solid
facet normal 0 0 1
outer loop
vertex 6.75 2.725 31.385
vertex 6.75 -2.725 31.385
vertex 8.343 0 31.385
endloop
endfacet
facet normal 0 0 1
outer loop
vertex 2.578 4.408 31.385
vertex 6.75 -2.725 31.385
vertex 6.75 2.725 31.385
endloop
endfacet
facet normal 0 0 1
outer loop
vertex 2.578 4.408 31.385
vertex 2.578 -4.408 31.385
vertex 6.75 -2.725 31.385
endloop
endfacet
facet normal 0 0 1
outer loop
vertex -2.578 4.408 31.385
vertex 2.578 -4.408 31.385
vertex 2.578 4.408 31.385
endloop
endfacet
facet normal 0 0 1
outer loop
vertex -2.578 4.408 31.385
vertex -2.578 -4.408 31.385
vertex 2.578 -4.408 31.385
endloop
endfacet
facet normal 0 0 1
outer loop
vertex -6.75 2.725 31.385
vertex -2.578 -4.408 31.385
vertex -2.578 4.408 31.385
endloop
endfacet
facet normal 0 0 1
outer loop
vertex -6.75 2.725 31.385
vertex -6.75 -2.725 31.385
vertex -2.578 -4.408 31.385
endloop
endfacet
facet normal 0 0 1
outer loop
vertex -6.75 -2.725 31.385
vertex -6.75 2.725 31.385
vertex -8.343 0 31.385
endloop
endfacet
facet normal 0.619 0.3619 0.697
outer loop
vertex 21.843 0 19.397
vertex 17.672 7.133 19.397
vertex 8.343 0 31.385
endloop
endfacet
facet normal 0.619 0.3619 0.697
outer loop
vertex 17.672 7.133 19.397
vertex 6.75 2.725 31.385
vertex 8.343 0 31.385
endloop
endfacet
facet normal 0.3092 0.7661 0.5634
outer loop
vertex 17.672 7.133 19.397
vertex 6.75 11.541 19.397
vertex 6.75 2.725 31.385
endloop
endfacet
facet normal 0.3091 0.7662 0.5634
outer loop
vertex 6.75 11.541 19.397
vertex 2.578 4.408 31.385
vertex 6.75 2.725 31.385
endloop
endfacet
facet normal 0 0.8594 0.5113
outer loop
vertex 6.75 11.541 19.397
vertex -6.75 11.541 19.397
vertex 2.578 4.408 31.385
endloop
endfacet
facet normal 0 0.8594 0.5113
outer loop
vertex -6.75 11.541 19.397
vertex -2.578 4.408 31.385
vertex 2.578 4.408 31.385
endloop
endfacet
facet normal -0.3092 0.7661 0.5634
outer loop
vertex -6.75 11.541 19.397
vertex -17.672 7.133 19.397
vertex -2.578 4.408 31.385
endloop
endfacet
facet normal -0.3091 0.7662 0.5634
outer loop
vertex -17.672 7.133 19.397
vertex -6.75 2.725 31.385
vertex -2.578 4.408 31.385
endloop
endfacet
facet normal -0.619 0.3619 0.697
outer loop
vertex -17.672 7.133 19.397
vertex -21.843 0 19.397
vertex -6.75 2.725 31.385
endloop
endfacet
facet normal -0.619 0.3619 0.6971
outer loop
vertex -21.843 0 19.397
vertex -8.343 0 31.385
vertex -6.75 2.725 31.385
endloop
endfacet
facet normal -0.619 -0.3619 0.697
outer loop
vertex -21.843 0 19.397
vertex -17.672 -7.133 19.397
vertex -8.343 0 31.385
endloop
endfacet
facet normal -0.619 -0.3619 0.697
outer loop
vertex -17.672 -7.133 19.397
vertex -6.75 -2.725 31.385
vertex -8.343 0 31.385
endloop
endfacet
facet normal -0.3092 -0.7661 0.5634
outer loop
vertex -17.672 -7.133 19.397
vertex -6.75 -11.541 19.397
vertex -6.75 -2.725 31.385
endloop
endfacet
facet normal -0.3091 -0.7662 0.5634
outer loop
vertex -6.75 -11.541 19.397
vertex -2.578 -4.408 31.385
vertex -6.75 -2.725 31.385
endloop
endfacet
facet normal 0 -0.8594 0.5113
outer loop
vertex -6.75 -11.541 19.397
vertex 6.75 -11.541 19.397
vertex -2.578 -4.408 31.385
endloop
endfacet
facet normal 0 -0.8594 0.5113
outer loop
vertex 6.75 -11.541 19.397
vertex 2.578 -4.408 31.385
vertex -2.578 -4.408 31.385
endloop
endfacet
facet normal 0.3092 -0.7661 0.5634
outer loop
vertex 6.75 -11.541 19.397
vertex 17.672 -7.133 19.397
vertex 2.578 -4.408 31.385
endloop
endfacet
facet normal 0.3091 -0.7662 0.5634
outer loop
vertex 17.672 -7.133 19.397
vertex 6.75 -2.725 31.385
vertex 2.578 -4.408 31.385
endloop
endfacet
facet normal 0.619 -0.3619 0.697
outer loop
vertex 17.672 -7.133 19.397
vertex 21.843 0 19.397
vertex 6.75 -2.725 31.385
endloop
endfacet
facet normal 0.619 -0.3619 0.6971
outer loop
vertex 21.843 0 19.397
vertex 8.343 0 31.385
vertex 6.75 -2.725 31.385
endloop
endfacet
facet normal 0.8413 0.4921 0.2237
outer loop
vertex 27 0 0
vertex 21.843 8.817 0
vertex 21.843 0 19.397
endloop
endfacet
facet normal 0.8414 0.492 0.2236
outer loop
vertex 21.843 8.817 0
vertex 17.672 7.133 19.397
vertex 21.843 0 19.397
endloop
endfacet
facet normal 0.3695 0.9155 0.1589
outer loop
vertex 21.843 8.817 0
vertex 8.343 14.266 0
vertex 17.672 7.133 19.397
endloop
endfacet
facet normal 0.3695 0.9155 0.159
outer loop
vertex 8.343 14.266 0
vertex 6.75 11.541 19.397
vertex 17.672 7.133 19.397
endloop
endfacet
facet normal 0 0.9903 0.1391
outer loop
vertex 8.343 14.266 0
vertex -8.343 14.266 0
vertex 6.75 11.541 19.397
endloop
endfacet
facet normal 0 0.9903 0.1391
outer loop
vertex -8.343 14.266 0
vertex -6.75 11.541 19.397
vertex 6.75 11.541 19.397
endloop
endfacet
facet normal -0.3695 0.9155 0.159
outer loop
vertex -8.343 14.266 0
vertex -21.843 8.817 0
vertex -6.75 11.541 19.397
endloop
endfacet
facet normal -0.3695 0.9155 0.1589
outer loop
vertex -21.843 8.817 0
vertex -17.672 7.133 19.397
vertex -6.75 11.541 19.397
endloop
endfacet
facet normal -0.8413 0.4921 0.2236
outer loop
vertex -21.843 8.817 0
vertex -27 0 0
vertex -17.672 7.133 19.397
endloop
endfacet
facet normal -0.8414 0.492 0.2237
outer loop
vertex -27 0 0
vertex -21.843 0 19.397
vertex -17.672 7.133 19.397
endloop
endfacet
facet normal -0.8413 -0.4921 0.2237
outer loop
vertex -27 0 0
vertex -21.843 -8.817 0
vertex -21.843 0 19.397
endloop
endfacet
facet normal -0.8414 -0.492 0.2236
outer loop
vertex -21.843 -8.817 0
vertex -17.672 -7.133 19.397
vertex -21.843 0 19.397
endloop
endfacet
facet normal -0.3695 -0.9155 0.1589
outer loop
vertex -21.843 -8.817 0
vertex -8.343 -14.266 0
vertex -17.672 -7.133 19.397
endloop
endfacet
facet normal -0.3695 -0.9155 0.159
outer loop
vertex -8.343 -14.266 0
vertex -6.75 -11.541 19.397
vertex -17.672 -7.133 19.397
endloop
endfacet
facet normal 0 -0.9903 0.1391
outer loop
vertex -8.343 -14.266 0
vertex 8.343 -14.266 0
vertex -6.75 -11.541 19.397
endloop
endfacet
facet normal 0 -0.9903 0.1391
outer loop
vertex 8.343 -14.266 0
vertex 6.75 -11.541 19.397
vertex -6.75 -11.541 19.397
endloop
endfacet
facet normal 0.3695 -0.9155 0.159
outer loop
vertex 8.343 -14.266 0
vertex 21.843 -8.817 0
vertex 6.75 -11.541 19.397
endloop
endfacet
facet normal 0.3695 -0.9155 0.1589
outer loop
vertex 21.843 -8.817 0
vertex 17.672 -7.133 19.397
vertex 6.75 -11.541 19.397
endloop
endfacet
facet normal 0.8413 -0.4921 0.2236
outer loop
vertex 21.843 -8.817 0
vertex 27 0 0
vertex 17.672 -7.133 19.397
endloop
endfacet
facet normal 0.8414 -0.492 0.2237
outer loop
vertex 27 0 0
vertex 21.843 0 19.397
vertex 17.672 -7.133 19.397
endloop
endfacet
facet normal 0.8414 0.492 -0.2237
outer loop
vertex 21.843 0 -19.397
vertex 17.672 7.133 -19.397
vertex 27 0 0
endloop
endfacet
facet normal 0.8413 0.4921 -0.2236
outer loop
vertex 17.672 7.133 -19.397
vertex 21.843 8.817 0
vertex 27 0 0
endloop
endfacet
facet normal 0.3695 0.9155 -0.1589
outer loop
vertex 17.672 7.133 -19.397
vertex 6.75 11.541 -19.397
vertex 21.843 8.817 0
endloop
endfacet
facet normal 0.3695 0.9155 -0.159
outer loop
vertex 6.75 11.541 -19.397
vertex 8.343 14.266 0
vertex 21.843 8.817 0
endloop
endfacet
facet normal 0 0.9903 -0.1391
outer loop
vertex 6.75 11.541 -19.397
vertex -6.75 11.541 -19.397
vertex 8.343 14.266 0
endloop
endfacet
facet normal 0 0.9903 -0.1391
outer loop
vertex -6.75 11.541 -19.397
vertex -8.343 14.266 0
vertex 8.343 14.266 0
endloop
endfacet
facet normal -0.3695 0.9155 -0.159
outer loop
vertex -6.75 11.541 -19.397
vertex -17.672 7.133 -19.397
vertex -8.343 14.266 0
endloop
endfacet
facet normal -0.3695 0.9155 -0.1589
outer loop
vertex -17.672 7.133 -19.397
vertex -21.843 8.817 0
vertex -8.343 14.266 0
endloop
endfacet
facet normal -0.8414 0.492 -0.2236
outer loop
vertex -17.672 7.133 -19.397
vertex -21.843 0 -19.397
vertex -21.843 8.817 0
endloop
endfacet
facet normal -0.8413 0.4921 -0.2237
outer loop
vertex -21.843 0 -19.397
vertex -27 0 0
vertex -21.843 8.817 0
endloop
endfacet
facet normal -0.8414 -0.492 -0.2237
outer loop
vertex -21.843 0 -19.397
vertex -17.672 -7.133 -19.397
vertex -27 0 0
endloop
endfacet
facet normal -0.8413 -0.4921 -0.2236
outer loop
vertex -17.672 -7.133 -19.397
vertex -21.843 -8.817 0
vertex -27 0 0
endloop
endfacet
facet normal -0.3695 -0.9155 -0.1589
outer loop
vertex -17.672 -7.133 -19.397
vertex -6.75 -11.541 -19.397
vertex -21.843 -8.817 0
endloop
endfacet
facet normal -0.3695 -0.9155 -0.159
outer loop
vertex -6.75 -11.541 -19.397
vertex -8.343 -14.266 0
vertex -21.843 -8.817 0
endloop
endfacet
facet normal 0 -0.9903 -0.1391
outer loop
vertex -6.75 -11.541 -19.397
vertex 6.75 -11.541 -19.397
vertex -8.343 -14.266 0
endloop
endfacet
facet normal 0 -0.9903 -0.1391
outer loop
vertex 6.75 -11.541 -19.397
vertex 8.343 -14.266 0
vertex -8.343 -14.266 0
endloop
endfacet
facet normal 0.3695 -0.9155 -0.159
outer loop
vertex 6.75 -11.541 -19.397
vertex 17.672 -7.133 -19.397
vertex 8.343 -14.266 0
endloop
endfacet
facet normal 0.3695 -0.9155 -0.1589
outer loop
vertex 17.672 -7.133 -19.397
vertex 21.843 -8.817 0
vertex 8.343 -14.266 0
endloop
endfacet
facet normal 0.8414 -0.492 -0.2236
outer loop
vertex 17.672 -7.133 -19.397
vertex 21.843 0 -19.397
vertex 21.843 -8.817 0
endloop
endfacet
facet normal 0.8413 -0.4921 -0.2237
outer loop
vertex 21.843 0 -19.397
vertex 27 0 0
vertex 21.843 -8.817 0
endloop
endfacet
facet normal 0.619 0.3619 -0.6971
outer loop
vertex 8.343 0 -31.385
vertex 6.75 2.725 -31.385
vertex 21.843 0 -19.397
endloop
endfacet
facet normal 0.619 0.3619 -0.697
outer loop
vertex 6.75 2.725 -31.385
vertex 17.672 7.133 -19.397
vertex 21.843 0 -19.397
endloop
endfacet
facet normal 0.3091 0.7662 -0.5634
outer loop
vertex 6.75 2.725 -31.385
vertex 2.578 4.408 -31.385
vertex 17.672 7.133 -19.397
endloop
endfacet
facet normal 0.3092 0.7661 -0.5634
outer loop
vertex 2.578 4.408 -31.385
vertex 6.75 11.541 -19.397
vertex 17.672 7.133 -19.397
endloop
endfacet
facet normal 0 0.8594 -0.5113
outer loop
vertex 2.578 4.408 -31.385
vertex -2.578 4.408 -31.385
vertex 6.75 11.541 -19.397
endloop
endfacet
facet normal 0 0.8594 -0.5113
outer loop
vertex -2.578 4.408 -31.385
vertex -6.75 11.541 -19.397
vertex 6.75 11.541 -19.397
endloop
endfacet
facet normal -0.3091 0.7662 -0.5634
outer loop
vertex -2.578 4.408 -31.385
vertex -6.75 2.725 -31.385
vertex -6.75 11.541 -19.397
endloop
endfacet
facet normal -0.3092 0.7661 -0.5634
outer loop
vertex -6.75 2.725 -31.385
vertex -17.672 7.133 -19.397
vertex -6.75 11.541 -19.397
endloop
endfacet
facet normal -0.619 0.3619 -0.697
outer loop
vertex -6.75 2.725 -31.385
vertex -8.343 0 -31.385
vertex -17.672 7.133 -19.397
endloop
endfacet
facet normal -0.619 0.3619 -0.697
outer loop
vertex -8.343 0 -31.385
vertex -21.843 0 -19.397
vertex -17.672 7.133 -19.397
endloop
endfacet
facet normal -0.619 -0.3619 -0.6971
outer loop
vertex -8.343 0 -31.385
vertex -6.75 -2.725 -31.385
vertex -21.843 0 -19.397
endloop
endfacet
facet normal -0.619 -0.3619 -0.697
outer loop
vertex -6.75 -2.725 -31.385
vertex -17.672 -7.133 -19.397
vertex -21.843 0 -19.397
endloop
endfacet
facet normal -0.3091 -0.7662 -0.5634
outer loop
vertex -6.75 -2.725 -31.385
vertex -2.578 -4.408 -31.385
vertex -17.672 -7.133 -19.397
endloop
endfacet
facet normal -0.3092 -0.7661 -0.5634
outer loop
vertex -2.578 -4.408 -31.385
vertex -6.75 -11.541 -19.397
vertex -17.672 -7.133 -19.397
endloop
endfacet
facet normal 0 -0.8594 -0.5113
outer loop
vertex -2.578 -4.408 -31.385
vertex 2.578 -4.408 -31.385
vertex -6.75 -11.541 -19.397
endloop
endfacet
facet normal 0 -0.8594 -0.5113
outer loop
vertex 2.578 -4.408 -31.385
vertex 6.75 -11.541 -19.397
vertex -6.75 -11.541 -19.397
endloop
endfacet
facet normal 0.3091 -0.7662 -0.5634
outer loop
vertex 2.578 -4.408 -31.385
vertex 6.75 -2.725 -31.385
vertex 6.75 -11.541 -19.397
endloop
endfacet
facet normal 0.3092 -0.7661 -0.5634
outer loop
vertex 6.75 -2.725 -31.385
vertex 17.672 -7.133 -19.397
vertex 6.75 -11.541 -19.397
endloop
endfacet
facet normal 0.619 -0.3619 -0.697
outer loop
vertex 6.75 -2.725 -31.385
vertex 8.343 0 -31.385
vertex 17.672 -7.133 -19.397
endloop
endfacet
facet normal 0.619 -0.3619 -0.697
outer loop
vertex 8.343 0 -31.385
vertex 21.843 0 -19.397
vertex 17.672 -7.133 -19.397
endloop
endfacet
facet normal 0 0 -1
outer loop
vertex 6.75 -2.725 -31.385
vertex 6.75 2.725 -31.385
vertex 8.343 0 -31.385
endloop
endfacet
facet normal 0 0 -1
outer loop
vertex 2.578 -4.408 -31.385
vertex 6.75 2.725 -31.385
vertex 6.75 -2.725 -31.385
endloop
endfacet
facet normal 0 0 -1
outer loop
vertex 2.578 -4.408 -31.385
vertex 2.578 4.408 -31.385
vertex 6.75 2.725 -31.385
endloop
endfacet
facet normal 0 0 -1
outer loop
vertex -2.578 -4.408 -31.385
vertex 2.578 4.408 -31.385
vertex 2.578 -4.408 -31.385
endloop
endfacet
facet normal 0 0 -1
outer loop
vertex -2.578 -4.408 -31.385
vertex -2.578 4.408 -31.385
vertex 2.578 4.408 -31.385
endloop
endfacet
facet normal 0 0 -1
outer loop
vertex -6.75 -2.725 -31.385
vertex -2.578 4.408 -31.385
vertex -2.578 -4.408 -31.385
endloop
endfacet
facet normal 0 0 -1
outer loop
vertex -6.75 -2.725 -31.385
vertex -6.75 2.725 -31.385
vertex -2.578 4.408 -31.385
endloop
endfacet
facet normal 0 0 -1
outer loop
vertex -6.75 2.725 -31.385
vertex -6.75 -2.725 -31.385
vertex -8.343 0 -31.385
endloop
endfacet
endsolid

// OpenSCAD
// Generated by SolidPython 1.0.1 on 2020-07-29 00:46:48


scale(v = [9, 5, 11]) {
	sphere(r = 3);
}
/***********************************************
*********      SolidPython code:      **********
************************************************
 
# import packages: SolidPython
from solid import *
from solid.utils import *
from itertools import chain, combinations, permutations


class Resize:

    def __init__(self, scad_file):
        self.scad_file = scad_file
        #self.scad_file = import_scad(scad_file)
        # cone/cylinder param:
        self.r1 = 0
        self.r2 = 0
        self.h = 0
        # rectangular prism param:
        self.w = 0
        self.l = 0
        # ellipse param:
        self.r = 0

    # import OpenScad code (file name corresponds to shape)


    # classify shape + parameters
    def assign(self, param1, param2, param3):
        if self.scad_file == 'cone.scad':
            self.r1 = param1
            self.r2 = param2
            self.h = param3
        elif self.scad_file == 'cylinder.scad':
            self.r1 = param1
            self.r2 = param2
            self.h = param3
        elif self.scad_file == 'rectangularPrism.scad':
            self.h = param1
            self.l = param2
            self.w = param3
        else:
            self.r = param1
            self.h = param2

    # resize parameters
    def iterate(self):
        x = range(3, 20, 2)
        i = 1
        if self.scad_file == 'cone.scad':
            tempList = list(permutations(x, 2))
            for temp in tempList:
                param1 = temp[0]
                param2 = temp[1]
                filepath = 'produced_scad_files/' + 'cone' + str(param1) + '_' + str(param2) + '_' + '.scad'
                scad_render_to_file(cylinder(h=param1, r1=param2, r2=0), filepath)

        elif self.scad_file == 'cylinder.scad':
            tempList = list(permutations(x, 3))
            for temp in tempList:
                param1 = temp[0]
                param2 = temp[1]
                filepath = 'produced_scad_files/' + 'cylinder' + str(param1) + '_' + str(param2) + '_' + '.scad'
                scad_render_to_file(cylinder(h=param1, r1=param2, r2=param2), filepath)

        elif self.scad_file == 'rectangularPrism.scad':
            tempList = list(permutations(x, 3))
            for temp in tempList:
                param1 = temp[0]
                param2 = temp[1]
                param3 = temp[2]
                filepath = 'produced_scad_files/' + 'rectangularPrism' + str(param1) + '_' + str(param2) + '_' + str(
                    param3) + '.scad'
                scad_render_to_file(cube(size=(param1, param2, param3)), filepath)

        elif self.scad_file == 'ellipse.scad':
            tempList = list(permutations(x, 4))
            for temp in tempList:
                param1 = temp[0]
                param2 = temp[1]
                param3 = temp[2]
                param4 = temp[3]
                filepath = 'produced_scad_files/' + 'ellipse' + str(param1) + '_' + str(param2) + '_' + str(param3) + '_' + str(param4) + '.scad'
                scad_render_to_file(scale([param1, param2, param3])(sphere(r=param4)), filepath)

    def render_to_scadfile(self):
        scad_render_to_file(scad, 'example.scad') 
 
************************************************/
